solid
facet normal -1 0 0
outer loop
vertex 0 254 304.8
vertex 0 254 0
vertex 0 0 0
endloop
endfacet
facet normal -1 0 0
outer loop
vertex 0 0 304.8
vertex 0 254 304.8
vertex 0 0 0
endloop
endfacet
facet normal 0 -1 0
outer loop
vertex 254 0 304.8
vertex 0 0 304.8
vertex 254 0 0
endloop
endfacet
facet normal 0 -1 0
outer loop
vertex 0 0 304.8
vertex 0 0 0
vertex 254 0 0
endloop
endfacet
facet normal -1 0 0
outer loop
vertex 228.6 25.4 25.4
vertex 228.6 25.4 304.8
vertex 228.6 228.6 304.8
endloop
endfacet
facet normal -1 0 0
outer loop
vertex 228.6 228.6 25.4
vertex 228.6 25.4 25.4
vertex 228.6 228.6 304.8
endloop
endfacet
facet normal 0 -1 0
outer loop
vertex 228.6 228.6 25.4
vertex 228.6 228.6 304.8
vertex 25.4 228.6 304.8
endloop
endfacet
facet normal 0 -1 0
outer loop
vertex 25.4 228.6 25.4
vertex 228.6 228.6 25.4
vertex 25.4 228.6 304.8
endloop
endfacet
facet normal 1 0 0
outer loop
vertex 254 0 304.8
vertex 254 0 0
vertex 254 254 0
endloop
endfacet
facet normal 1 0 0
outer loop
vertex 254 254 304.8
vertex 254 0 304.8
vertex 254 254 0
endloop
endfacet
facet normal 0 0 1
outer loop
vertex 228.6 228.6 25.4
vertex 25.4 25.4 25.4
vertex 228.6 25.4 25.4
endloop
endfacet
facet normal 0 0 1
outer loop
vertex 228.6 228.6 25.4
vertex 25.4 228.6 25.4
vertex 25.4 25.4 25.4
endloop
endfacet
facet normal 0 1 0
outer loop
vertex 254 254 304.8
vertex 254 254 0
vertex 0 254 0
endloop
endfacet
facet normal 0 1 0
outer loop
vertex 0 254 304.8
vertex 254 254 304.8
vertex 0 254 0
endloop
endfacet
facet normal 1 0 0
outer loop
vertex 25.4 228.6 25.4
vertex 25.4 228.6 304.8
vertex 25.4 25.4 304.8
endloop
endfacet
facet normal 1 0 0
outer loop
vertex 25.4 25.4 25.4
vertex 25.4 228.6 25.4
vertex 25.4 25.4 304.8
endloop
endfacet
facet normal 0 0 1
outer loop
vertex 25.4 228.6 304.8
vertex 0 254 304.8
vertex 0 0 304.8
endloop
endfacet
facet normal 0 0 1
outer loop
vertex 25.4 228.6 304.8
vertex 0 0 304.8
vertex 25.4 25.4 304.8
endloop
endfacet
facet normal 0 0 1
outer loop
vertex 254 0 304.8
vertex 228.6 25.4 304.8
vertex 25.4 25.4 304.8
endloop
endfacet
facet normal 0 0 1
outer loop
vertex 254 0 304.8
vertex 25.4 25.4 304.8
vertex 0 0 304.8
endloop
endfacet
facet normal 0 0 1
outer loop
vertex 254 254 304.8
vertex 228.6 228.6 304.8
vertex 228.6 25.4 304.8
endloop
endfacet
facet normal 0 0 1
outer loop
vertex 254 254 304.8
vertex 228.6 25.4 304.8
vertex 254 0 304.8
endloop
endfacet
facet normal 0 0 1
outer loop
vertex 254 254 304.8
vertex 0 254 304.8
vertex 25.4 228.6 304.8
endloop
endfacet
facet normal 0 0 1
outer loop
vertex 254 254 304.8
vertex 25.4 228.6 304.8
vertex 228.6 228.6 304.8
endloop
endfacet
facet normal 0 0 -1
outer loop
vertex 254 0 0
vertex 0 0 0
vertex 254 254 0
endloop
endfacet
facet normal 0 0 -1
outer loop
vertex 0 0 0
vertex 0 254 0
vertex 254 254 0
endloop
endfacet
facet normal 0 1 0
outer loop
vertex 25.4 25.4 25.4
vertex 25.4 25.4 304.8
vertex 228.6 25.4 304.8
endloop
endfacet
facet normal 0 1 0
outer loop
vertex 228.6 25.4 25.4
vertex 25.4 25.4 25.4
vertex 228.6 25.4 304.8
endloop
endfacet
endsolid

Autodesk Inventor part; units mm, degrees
ref_plane "YZ Plane" through (0, 0, 0) normal (1, 0, 0) x (0, 1, 0)
ref_plane "XZ Plane" through (0, 0, 0) normal (0, 1, 0) x (-1, 0, 0)
ref_plane "XY Plane" through (0, 0, 0) normal (0, 0, 1) x (1, 0, 0)
sketch "Sketch1" plane through (0, 0, 0) normal (0, 0, 1) x (1, 0, 0)
  line L0 (0, 0) -> (254, 0)
  line L1 (254, 0) -> (254, 254)
  line L2 (254, 254) -> (0, 254)
  line L3 (0, 254) -> (0, 0)
  dimension "d0" = 254
  dimension "d1" = 254
extrude "Extrusion1" add sketch "Sketch1" along normal blind 304.8
shell "Shell1" thickness 25.4 removed faces 1 at (169.3333, 84.6667, 304.8)
equation "\"d1\" = d0"
properties part number "Blue truck"
